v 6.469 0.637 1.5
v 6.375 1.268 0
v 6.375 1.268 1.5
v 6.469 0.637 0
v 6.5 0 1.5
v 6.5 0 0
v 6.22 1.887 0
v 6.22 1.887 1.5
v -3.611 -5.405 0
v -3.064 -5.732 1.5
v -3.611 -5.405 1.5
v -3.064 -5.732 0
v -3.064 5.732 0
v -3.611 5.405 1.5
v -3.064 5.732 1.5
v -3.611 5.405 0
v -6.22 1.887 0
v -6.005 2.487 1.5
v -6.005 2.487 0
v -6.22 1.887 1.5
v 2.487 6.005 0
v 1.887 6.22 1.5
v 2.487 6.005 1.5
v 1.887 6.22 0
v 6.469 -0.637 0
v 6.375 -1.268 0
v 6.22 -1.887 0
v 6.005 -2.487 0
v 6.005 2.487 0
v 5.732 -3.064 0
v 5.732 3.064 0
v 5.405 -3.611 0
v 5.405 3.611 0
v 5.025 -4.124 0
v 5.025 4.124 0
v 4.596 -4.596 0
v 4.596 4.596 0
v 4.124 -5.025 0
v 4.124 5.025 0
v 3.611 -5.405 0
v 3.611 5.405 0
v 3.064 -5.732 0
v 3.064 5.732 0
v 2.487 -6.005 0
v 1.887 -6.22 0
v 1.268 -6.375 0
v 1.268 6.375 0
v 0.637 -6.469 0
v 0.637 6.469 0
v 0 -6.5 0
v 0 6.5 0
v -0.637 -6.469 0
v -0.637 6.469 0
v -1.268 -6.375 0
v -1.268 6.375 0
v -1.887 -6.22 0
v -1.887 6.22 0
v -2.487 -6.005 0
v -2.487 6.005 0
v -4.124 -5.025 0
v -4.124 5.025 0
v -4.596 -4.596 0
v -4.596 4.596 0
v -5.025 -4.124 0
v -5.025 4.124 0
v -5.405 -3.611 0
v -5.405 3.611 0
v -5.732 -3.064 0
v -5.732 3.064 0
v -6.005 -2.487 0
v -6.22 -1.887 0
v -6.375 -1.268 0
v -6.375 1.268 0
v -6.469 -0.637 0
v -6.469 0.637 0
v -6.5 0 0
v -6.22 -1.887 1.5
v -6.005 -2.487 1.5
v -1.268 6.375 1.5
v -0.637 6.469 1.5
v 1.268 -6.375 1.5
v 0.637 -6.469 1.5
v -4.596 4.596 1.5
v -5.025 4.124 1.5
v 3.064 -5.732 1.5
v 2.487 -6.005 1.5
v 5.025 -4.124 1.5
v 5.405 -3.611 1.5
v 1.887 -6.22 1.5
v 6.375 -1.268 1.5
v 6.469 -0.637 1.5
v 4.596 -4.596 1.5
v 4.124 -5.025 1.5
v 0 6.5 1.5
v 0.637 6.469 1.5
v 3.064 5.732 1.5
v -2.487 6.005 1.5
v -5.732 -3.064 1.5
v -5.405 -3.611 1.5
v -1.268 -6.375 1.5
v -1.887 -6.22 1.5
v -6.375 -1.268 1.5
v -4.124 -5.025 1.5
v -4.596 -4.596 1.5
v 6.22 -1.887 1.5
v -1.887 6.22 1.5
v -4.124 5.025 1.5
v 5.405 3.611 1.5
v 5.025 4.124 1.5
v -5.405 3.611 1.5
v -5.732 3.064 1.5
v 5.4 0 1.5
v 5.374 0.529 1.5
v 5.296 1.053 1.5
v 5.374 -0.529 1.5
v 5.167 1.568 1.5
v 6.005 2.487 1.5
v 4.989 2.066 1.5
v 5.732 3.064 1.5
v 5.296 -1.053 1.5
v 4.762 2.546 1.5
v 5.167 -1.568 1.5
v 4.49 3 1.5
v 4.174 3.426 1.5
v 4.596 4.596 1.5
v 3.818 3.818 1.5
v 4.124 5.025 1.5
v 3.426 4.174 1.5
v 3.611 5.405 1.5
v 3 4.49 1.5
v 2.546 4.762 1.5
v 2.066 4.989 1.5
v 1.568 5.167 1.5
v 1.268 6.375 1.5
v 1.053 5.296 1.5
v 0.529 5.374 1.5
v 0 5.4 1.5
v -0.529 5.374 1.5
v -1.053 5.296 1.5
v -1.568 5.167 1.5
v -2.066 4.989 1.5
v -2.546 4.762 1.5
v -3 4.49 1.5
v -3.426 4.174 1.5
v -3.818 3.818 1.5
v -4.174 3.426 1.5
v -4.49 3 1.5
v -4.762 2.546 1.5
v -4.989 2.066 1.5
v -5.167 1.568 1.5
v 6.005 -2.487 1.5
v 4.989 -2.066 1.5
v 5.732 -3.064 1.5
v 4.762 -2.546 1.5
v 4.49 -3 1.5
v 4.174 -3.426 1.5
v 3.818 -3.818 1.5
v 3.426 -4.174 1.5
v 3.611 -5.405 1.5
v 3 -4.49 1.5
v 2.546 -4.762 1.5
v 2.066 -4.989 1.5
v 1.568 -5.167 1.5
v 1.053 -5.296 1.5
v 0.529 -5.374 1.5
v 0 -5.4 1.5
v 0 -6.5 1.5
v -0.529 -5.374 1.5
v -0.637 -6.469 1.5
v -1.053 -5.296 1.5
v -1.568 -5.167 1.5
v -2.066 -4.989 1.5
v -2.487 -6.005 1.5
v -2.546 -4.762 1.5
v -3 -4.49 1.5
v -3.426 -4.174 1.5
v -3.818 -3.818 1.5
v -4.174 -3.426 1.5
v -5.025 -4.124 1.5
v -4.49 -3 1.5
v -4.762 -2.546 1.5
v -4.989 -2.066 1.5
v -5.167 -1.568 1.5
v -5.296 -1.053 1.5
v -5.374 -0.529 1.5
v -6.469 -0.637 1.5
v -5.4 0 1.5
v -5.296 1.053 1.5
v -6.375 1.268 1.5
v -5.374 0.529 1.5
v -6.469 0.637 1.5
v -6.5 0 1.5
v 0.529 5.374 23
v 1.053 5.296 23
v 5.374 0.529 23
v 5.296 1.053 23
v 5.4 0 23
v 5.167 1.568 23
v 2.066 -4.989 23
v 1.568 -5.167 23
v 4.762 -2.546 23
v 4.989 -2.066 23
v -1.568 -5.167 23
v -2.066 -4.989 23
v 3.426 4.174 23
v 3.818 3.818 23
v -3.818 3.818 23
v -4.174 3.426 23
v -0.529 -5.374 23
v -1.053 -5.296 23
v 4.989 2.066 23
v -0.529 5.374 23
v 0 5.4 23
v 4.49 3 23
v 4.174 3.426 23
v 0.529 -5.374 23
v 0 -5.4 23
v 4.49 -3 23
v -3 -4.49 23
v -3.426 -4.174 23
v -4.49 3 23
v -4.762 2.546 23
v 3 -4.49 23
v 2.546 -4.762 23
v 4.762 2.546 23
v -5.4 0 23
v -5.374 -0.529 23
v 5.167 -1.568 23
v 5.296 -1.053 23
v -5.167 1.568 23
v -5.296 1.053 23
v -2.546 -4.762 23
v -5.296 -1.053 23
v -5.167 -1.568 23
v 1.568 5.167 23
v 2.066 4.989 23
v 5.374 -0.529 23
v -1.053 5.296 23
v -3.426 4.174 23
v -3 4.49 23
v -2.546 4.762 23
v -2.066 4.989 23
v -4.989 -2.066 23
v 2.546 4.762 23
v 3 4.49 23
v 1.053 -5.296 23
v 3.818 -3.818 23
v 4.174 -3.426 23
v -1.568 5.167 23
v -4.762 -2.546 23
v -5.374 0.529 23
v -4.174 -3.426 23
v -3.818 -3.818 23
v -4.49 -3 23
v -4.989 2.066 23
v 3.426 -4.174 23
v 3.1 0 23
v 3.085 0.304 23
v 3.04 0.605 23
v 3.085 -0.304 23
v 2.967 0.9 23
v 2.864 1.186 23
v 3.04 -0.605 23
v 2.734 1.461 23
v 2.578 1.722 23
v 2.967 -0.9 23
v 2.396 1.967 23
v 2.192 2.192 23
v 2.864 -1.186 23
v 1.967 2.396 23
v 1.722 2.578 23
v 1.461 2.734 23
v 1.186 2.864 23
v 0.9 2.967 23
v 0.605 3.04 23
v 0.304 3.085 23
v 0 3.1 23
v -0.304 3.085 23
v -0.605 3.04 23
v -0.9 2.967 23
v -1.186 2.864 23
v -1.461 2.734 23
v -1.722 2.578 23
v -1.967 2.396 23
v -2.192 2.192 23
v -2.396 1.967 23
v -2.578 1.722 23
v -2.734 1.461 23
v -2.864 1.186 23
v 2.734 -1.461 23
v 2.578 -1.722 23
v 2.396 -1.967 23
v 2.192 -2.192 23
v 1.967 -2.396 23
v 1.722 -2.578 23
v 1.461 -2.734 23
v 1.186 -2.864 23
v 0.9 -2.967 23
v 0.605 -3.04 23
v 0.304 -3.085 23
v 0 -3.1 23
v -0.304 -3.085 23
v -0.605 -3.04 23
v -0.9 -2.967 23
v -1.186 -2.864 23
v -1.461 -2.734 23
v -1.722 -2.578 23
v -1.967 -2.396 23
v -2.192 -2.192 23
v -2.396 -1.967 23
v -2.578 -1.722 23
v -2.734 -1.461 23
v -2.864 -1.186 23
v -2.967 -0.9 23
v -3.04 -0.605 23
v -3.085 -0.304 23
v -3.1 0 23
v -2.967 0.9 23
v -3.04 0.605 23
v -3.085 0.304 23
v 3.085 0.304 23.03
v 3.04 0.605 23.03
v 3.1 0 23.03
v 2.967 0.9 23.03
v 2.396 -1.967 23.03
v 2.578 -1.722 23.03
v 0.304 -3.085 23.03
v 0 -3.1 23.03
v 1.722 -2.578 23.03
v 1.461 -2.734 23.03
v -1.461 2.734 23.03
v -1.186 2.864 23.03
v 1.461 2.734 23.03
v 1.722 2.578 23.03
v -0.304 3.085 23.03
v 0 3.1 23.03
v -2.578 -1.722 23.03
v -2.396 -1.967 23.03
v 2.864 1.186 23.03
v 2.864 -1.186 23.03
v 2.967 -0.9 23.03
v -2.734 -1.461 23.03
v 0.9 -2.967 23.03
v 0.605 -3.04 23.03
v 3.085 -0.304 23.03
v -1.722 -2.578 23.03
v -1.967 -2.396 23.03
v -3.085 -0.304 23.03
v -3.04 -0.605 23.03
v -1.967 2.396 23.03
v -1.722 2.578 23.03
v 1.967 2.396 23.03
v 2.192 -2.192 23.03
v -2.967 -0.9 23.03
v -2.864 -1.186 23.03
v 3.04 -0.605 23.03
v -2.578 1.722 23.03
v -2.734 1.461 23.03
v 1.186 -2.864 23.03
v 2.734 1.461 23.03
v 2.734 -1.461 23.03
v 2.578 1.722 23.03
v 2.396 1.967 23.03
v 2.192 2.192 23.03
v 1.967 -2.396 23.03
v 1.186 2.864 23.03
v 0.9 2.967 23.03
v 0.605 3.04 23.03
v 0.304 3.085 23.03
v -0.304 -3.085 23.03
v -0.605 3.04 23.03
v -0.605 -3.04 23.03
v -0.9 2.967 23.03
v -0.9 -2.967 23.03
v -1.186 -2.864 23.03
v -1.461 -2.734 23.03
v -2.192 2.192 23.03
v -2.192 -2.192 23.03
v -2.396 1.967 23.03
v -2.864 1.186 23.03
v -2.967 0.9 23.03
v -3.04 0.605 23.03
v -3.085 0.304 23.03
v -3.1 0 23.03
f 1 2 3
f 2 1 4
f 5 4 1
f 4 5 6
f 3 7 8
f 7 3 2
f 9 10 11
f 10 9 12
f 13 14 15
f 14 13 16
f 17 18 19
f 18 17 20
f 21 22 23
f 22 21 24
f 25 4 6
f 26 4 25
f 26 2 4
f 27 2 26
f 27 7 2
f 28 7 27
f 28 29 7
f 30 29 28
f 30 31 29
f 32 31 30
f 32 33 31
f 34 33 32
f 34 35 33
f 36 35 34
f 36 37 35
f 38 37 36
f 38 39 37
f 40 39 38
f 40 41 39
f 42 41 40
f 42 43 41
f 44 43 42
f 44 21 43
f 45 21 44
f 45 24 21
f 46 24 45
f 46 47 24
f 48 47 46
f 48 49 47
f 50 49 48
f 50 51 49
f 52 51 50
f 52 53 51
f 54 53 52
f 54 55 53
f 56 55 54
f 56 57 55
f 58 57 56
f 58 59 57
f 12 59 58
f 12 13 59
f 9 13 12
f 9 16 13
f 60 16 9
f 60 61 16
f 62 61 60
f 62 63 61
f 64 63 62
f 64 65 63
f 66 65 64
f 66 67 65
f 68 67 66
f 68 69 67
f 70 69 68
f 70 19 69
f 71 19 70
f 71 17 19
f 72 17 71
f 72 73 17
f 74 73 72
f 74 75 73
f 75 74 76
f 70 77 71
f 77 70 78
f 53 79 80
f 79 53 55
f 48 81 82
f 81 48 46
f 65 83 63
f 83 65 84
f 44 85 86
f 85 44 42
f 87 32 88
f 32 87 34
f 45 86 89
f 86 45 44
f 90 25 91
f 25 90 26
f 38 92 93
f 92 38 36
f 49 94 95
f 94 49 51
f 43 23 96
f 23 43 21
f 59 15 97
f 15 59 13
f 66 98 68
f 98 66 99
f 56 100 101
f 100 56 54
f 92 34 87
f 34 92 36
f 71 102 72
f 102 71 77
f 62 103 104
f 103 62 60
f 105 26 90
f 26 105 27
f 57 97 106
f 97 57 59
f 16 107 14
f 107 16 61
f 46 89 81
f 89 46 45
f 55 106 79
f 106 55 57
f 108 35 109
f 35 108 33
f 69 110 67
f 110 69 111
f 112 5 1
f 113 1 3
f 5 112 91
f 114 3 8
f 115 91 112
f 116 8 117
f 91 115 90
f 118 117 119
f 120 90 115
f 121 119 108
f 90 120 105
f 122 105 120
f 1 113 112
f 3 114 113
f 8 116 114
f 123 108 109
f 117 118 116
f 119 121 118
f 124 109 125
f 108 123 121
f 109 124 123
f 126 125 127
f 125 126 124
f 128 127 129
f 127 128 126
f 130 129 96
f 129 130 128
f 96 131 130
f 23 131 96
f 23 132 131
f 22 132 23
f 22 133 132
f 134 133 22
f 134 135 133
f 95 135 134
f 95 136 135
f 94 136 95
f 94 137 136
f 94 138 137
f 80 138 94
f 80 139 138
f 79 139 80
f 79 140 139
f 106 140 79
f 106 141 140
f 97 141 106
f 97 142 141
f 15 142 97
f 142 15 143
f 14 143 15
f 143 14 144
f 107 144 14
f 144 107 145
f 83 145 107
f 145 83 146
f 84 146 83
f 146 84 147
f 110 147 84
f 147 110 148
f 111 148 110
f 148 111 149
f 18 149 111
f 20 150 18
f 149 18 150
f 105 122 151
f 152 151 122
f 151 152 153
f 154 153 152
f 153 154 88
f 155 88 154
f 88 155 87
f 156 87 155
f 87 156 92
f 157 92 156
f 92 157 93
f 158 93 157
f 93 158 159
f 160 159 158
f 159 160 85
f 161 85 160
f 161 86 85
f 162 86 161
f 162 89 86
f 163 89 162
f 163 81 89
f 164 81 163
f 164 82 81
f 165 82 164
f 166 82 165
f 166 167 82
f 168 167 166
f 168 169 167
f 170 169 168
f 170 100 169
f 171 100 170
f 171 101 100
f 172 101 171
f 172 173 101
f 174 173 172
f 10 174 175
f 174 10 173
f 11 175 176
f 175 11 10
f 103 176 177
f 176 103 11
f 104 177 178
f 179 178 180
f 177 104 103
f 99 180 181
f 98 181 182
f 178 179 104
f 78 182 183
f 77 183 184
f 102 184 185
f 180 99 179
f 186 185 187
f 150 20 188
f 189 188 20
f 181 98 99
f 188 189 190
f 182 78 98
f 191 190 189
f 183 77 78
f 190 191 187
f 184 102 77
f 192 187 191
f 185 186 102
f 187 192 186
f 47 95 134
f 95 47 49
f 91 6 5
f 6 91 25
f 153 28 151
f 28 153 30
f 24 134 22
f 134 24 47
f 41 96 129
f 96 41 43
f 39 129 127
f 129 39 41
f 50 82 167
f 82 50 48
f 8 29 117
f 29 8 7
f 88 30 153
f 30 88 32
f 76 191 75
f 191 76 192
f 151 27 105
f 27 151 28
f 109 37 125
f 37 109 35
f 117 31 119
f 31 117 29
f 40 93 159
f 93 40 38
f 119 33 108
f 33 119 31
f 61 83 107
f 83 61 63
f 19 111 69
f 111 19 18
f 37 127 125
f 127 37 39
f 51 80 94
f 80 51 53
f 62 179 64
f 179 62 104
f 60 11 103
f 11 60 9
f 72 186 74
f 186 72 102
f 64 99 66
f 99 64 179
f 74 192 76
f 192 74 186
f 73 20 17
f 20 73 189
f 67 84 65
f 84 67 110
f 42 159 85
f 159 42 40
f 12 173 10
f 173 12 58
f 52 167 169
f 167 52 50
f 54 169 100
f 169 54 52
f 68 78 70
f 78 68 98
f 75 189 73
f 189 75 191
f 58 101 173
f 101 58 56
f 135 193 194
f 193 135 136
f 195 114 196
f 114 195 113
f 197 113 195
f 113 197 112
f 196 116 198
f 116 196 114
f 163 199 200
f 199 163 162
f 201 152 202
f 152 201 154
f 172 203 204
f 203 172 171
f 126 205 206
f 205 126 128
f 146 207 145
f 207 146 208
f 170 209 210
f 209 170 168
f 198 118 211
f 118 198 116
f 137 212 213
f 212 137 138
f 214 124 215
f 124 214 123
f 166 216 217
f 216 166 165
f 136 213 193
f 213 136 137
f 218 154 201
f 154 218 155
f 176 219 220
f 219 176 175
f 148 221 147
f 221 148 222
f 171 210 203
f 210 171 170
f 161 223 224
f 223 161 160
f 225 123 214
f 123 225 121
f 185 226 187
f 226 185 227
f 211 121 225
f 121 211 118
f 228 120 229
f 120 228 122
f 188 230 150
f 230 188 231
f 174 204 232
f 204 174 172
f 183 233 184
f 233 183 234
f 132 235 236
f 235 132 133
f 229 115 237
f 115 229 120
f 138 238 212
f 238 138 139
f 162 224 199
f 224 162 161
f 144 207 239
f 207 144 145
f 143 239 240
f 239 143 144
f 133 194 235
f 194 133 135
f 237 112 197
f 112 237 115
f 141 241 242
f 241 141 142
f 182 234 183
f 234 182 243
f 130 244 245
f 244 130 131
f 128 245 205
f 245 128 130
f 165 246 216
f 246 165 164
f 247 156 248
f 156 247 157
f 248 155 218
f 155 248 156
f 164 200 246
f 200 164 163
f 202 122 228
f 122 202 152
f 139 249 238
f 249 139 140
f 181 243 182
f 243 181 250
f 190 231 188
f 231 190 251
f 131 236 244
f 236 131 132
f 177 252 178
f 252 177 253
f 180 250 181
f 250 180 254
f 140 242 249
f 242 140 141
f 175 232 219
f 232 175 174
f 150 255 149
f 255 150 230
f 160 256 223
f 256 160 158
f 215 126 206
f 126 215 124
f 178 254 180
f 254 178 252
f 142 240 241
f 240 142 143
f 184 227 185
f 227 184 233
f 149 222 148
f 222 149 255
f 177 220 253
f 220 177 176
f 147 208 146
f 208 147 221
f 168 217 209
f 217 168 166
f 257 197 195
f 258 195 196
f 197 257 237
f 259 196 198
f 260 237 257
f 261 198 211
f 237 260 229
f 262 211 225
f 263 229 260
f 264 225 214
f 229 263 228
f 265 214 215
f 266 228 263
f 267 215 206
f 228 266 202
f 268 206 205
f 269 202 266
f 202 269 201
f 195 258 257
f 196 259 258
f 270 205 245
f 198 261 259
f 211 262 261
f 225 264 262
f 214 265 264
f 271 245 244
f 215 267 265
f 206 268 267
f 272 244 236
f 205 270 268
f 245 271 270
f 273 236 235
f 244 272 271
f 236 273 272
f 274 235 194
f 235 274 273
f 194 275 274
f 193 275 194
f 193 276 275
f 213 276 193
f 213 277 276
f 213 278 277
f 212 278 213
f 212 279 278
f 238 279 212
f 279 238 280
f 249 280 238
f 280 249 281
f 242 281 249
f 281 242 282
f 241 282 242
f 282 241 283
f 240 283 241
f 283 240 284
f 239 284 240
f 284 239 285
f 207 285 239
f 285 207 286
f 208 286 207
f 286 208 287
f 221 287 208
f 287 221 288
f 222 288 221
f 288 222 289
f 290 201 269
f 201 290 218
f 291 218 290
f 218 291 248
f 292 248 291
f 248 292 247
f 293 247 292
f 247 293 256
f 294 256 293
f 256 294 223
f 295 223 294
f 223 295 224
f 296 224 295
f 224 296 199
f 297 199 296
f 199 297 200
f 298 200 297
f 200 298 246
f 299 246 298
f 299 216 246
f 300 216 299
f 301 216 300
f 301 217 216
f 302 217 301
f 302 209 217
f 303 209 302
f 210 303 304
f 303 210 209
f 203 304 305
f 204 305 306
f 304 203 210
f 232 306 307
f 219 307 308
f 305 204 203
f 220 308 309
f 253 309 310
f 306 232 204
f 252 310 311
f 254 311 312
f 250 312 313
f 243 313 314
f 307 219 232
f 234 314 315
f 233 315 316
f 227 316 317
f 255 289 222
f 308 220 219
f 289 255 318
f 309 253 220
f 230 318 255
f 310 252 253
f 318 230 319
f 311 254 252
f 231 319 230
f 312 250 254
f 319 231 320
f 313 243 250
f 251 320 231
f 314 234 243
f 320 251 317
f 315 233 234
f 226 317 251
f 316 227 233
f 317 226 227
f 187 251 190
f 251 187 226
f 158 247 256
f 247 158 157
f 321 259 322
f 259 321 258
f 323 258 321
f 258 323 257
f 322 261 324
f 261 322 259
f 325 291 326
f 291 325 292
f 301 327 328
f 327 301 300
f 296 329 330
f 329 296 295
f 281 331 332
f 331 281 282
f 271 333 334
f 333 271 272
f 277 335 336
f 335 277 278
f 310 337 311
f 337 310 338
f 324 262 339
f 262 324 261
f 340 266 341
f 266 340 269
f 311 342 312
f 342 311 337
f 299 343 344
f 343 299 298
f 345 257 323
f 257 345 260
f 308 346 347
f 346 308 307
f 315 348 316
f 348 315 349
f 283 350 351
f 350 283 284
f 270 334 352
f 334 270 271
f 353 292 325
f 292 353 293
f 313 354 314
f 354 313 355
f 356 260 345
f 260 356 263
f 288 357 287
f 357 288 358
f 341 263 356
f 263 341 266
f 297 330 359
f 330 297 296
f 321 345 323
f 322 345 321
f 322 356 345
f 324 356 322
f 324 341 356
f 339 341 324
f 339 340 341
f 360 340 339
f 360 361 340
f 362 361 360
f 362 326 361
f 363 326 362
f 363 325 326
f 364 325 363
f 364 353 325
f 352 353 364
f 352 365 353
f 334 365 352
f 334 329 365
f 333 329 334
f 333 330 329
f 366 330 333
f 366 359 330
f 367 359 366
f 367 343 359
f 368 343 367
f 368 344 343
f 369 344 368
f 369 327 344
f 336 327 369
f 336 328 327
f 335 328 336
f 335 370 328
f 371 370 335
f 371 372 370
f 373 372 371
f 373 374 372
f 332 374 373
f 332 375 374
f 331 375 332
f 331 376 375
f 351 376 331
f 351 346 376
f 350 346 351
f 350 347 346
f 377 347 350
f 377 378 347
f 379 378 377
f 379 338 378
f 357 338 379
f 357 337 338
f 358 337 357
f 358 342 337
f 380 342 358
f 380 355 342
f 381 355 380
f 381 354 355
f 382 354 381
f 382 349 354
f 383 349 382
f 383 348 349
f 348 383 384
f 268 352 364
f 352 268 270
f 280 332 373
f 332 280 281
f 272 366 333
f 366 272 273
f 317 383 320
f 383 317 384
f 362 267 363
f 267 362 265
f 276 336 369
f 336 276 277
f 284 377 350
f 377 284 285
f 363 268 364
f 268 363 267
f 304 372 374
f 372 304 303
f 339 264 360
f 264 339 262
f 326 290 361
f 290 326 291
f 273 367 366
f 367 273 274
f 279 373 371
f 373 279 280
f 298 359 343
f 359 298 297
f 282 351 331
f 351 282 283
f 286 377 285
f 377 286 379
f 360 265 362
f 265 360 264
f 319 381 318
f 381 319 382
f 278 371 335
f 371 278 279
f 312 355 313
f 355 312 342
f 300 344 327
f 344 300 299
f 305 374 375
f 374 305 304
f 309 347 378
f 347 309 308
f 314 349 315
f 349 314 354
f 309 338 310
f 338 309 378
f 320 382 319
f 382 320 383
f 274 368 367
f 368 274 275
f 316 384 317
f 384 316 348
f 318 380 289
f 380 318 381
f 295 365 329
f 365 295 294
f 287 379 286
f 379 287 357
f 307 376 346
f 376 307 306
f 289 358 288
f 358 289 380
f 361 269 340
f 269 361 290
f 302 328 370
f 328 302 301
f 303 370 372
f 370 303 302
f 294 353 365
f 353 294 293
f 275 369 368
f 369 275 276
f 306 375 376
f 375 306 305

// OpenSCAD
// Adapter sleeve for 0.2 mL PCR tube in 1.5 mL rack hole
// Print orientation: upside down (collar on bed, sleeve body upward)

// Dimensions
collar_diameter = 13;       // mm, outer diameter of collar
collar_thickness = 1.5;     // mm, height of collar
sleeve_od = 10.8;           // mm, outer diameter of sleeve body
sleeve_height = 21.5;       // mm, height of sleeve body (from collar top to top of sleeve)
bore_diameter = 6.2;        // mm, inner bore diameter

// Resolution
$fn = 64;

// Collar (bottom part) - from z=0 to z=1.5
module collar_part() {
    collar_radius = collar_diameter / 2;
    bore_radius = bore_diameter / 2;
    
    // Main collar cylinder
    cylinder(h = collar_thickness, r = collar_radius, center = false);
    
    // Subtract bore (extend 0.01 mm below and above collar)
    translate([0, 0, 0.01]) {
        cylinder(h = collar_thickness + 0.02, r = bore_radius, center = false);
    }
}

// Sleeve body (on top of collar) - from z=1.5 to z=23.0
module sleeve_body() {
    sleeve_radius = sleeve_od / 2;
    bore_radius = bore_diameter / 2;
    
    // Main sleeve cylinder
    translate([0, 0, collar_thickness]) {
        cylinder(h = sleeve_height, r = sleeve_radius, center = false);
    }
    
    // Subtract bore (extend 0.01 mm below and above sleeve body)
    translate([0, 0, collar_thickness + 0.01]) {
        cylinder(h = sleeve_height + 0.02, r = bore_radius, center = false);
    }
}

// Build the complete adapter
collar_part();
sleeve_body();
